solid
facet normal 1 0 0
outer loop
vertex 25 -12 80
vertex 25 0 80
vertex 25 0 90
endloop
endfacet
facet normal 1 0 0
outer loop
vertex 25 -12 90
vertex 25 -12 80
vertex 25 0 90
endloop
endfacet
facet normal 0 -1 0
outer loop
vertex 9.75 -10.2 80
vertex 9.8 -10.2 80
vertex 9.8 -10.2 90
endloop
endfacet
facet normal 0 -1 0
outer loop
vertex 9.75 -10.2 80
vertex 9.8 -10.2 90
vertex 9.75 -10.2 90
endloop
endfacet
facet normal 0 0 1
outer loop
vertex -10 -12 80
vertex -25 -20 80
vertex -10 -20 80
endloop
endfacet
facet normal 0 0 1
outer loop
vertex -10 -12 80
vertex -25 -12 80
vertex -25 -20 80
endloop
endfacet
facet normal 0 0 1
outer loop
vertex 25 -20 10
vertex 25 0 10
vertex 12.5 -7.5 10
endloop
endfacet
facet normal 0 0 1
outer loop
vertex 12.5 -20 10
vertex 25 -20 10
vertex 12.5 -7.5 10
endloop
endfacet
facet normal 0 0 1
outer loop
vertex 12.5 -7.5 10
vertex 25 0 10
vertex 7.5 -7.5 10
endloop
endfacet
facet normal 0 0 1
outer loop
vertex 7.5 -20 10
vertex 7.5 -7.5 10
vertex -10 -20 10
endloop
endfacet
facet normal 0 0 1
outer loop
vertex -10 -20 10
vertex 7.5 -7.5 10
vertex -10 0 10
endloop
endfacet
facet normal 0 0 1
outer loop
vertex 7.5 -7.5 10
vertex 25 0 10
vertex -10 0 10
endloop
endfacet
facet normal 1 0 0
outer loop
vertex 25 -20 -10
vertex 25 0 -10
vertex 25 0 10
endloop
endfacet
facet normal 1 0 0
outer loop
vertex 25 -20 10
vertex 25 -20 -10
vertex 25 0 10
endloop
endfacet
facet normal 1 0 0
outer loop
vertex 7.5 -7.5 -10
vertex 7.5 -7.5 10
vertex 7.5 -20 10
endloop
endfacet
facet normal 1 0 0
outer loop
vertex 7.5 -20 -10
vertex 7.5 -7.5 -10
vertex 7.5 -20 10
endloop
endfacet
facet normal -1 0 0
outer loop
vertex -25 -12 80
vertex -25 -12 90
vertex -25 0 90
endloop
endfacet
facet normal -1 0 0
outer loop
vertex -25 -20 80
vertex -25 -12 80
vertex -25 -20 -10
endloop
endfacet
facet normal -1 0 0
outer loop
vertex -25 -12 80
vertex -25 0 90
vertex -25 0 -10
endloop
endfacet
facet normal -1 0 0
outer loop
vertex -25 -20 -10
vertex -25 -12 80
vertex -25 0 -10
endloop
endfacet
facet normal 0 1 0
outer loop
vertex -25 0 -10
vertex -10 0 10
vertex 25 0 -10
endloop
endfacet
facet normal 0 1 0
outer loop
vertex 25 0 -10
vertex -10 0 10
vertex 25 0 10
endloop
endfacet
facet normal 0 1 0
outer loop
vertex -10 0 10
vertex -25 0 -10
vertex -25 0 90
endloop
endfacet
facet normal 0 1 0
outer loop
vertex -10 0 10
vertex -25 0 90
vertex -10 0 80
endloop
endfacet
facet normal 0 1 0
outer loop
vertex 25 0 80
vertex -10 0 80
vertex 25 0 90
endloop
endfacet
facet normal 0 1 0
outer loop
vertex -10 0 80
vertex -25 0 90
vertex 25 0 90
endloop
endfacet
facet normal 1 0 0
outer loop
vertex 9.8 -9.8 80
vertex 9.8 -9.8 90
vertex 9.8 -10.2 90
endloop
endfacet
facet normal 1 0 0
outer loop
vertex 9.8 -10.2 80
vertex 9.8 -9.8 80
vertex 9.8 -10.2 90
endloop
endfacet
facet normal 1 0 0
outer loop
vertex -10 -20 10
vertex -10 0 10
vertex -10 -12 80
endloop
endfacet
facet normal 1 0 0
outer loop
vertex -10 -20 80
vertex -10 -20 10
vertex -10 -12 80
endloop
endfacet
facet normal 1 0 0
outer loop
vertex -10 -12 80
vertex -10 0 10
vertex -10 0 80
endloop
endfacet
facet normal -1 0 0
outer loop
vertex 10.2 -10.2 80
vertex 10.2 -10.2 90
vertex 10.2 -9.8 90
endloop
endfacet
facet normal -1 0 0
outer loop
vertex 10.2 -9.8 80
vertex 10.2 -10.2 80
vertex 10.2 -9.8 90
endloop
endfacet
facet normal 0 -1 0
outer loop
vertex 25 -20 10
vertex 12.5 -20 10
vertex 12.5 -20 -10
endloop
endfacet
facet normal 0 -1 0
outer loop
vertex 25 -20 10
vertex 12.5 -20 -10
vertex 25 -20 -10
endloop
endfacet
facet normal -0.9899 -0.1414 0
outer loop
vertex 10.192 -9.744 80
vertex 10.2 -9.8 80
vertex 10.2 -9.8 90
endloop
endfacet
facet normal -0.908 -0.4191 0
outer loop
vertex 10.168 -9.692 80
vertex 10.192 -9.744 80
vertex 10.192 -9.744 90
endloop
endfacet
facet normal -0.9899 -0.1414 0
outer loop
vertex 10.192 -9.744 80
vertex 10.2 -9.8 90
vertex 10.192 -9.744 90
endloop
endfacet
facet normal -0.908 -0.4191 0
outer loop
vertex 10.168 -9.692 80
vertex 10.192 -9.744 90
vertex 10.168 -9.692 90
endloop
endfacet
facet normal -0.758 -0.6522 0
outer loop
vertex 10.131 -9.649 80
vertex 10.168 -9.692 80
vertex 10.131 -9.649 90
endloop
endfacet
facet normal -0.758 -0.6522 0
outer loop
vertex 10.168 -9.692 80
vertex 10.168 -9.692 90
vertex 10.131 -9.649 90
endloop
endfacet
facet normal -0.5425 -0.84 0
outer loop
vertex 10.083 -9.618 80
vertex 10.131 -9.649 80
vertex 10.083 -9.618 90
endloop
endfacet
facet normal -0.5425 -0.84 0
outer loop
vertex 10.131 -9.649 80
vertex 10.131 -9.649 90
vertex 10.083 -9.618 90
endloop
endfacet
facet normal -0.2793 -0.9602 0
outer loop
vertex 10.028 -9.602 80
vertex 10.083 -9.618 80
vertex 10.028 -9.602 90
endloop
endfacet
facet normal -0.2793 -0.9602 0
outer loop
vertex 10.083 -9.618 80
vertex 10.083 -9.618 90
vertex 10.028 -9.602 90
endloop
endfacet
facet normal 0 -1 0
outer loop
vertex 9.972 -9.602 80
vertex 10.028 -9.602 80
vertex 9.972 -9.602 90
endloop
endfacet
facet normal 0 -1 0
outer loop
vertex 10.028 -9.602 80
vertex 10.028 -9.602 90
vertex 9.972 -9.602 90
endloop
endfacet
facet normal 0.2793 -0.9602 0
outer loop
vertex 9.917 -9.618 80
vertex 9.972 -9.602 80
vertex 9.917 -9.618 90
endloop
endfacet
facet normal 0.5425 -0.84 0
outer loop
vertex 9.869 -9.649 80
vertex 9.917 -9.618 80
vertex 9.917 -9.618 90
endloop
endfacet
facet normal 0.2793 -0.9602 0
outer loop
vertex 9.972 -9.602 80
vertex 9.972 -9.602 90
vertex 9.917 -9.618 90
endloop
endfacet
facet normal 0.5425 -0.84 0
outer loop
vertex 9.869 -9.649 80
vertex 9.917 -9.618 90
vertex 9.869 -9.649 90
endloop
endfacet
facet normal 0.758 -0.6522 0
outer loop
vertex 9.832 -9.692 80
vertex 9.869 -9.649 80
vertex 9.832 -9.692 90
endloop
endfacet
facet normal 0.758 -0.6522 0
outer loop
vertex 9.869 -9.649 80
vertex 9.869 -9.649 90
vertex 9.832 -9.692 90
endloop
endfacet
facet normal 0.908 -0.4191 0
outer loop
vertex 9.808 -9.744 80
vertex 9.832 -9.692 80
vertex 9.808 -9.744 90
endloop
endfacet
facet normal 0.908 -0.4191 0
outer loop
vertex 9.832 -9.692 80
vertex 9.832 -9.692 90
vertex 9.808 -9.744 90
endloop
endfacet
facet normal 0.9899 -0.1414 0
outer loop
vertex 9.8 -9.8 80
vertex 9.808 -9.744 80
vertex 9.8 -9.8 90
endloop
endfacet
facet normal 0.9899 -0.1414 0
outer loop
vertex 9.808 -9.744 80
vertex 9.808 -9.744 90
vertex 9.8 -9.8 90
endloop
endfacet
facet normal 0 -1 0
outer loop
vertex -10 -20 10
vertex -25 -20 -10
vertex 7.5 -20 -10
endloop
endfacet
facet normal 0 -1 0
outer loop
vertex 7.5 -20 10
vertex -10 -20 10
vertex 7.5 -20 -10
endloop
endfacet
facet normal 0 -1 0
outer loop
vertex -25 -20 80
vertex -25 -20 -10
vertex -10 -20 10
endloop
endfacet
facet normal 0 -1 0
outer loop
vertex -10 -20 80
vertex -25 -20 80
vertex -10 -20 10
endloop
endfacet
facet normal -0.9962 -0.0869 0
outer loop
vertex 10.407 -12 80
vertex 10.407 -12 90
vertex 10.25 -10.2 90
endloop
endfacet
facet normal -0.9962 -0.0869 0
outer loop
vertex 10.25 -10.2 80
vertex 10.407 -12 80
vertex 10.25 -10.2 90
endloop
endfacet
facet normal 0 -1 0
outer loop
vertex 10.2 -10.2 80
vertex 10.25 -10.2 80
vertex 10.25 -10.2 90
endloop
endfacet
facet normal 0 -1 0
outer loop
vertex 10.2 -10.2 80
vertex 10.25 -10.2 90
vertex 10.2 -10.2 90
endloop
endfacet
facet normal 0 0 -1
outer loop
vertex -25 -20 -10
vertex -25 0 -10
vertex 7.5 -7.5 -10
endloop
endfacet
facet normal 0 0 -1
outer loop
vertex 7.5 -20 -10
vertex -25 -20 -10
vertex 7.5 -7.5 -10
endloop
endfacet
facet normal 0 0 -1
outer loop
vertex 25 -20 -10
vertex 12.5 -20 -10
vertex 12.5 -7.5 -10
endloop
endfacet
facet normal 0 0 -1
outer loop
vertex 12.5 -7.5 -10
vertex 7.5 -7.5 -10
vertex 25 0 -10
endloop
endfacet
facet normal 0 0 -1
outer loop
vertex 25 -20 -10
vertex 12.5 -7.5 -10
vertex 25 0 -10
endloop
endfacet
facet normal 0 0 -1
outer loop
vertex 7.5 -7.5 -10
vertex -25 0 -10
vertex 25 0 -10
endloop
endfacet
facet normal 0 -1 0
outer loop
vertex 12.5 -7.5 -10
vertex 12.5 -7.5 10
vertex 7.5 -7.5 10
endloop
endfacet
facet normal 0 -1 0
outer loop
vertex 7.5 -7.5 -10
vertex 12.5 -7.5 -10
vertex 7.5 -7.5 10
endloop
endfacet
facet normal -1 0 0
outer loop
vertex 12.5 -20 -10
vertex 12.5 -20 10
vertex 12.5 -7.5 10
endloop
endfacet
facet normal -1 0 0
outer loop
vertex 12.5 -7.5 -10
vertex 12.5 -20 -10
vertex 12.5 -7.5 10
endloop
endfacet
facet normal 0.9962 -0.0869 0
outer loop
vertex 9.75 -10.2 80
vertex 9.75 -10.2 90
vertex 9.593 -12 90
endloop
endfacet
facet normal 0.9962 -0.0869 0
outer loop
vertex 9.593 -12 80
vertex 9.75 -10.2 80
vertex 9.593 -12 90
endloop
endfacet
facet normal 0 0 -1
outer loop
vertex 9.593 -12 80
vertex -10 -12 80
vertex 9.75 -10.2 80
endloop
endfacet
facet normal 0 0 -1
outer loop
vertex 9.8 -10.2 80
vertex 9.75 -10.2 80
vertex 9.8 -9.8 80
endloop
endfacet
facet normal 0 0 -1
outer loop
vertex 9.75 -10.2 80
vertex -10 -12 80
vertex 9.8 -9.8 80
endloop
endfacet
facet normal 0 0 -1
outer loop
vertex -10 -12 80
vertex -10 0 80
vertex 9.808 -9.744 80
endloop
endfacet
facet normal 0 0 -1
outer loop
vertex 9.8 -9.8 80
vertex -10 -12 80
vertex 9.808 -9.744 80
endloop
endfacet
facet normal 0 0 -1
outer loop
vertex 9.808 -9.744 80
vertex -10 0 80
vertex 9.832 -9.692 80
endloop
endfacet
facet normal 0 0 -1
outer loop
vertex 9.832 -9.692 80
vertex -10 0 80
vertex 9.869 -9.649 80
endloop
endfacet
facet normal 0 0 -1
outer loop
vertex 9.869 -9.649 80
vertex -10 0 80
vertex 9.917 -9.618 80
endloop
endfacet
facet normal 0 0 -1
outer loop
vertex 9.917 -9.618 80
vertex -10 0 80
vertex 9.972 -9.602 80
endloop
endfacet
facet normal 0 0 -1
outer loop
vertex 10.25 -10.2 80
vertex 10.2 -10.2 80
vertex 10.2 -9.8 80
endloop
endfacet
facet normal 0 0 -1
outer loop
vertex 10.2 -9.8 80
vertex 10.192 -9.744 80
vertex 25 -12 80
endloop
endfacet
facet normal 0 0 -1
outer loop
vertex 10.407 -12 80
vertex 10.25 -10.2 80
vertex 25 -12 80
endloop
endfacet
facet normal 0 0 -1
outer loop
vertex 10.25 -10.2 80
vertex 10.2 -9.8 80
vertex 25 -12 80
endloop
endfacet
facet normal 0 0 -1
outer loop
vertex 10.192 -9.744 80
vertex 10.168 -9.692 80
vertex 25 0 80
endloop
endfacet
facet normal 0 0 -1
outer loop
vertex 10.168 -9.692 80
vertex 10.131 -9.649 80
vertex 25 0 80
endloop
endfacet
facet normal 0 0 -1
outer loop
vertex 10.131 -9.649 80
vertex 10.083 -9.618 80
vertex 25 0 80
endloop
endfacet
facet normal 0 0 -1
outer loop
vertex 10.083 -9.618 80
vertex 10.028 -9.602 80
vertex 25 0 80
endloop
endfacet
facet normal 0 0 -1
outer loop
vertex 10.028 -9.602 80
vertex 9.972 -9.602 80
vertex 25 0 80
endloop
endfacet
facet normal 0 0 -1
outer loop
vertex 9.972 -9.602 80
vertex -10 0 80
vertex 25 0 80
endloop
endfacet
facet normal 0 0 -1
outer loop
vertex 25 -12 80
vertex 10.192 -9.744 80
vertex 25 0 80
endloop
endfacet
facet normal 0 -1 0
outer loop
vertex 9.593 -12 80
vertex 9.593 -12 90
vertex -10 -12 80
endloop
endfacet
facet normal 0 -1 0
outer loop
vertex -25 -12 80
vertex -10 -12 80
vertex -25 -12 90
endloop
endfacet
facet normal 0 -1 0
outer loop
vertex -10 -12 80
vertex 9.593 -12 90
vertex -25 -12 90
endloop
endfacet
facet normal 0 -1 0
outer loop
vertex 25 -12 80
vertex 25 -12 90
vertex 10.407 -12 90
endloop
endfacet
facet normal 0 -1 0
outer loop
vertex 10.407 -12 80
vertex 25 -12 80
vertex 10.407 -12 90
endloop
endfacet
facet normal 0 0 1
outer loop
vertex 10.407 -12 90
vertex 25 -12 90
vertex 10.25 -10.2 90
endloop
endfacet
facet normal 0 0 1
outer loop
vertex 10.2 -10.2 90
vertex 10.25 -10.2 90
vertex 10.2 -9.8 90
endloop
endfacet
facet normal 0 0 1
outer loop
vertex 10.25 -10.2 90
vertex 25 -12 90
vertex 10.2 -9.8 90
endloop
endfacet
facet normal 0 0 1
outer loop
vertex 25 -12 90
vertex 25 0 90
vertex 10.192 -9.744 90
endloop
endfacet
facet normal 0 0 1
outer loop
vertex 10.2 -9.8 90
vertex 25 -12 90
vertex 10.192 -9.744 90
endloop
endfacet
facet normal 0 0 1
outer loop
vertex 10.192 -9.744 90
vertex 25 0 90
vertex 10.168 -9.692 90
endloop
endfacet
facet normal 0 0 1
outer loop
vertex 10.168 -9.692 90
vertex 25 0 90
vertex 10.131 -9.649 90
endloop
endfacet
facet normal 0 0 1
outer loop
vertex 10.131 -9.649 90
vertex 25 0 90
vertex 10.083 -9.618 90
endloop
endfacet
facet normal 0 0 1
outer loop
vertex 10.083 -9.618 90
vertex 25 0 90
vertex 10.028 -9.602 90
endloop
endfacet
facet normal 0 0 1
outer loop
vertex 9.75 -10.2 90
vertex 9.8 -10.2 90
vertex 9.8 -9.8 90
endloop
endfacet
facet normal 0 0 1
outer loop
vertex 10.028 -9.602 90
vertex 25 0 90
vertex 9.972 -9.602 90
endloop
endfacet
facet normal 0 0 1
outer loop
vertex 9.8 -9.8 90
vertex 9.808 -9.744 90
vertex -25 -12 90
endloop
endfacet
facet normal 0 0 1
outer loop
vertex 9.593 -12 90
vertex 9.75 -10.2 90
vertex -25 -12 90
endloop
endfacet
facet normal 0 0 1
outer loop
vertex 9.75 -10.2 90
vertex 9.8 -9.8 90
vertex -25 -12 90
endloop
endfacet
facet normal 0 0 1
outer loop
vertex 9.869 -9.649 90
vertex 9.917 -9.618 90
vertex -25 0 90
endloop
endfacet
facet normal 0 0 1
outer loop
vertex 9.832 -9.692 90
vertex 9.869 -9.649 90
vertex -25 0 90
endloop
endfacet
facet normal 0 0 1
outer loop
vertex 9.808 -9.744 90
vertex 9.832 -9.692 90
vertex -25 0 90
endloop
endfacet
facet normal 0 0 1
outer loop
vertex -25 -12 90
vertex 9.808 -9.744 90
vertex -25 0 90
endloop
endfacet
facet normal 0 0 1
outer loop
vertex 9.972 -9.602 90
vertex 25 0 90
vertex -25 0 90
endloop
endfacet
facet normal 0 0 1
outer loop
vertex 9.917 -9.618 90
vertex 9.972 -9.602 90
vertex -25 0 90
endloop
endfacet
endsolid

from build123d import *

# Parameters (mm, degrees)
F1_DEPTH = 20
F3_DEPTH = 20
F5_DEPTH = 25
F7_DEPTH = 10


with BuildPart() as f1:
    # F0 (on Front) → F1 (new body)
    with BuildSketch(Plane.XZ):
        Polygon((-25, -10), (25, -10), (25, 10), (-10, 10), (-10, 80), (25, 80), (25, 90), (-10, 90), (-25, 90), (-25, 10), align=None)
    extrude(amount=F1_DEPTH)

    # F2 (on face) → F3 (cut)
    with BuildSketch(Plane.XY.offset(10)):
        Polygon((12.5, -12.5), (12.5, -7.5), (7.5, -7.5), (7.5, -12.5), (7.5, -20), (12.5, -20), align=None)
    extrude(amount=-F3_DEPTH, mode=Mode.SUBTRACT)

    # F4 (on face) → F5 (cut)
    with BuildSketch(Plane.XY.offset(90)):
        with BuildLine():
            ThreePointArc((9.8, -10.2), (10, -10.4), (10.2, -10.2))
            Line((10.2, -10.2), (10.2, -9.8))
            ThreePointArc((10.2, -9.8), (10, -9.6), (9.8, -9.8))
            Line((9.8, -9.8), (9.8, -10.2))
        make_face()
    extrude(amount=-F5_DEPTH, mode=Mode.SUBTRACT)

    # F6 (on face) → F7 (cut)
    with BuildSketch(Plane.XY.offset(90)):
        Polygon((25, -20), (25, -12), (10.40748, -12), (10.25, -10.2), (10.2, -10.2), (9.8, -10.2), (9.75, -10.2), (9.59252, -12), (-25, -12), (-25, -20), align=None)
    extrude(amount=-F7_DEPTH, mode=Mode.SUBTRACT)


solid = f1.part
